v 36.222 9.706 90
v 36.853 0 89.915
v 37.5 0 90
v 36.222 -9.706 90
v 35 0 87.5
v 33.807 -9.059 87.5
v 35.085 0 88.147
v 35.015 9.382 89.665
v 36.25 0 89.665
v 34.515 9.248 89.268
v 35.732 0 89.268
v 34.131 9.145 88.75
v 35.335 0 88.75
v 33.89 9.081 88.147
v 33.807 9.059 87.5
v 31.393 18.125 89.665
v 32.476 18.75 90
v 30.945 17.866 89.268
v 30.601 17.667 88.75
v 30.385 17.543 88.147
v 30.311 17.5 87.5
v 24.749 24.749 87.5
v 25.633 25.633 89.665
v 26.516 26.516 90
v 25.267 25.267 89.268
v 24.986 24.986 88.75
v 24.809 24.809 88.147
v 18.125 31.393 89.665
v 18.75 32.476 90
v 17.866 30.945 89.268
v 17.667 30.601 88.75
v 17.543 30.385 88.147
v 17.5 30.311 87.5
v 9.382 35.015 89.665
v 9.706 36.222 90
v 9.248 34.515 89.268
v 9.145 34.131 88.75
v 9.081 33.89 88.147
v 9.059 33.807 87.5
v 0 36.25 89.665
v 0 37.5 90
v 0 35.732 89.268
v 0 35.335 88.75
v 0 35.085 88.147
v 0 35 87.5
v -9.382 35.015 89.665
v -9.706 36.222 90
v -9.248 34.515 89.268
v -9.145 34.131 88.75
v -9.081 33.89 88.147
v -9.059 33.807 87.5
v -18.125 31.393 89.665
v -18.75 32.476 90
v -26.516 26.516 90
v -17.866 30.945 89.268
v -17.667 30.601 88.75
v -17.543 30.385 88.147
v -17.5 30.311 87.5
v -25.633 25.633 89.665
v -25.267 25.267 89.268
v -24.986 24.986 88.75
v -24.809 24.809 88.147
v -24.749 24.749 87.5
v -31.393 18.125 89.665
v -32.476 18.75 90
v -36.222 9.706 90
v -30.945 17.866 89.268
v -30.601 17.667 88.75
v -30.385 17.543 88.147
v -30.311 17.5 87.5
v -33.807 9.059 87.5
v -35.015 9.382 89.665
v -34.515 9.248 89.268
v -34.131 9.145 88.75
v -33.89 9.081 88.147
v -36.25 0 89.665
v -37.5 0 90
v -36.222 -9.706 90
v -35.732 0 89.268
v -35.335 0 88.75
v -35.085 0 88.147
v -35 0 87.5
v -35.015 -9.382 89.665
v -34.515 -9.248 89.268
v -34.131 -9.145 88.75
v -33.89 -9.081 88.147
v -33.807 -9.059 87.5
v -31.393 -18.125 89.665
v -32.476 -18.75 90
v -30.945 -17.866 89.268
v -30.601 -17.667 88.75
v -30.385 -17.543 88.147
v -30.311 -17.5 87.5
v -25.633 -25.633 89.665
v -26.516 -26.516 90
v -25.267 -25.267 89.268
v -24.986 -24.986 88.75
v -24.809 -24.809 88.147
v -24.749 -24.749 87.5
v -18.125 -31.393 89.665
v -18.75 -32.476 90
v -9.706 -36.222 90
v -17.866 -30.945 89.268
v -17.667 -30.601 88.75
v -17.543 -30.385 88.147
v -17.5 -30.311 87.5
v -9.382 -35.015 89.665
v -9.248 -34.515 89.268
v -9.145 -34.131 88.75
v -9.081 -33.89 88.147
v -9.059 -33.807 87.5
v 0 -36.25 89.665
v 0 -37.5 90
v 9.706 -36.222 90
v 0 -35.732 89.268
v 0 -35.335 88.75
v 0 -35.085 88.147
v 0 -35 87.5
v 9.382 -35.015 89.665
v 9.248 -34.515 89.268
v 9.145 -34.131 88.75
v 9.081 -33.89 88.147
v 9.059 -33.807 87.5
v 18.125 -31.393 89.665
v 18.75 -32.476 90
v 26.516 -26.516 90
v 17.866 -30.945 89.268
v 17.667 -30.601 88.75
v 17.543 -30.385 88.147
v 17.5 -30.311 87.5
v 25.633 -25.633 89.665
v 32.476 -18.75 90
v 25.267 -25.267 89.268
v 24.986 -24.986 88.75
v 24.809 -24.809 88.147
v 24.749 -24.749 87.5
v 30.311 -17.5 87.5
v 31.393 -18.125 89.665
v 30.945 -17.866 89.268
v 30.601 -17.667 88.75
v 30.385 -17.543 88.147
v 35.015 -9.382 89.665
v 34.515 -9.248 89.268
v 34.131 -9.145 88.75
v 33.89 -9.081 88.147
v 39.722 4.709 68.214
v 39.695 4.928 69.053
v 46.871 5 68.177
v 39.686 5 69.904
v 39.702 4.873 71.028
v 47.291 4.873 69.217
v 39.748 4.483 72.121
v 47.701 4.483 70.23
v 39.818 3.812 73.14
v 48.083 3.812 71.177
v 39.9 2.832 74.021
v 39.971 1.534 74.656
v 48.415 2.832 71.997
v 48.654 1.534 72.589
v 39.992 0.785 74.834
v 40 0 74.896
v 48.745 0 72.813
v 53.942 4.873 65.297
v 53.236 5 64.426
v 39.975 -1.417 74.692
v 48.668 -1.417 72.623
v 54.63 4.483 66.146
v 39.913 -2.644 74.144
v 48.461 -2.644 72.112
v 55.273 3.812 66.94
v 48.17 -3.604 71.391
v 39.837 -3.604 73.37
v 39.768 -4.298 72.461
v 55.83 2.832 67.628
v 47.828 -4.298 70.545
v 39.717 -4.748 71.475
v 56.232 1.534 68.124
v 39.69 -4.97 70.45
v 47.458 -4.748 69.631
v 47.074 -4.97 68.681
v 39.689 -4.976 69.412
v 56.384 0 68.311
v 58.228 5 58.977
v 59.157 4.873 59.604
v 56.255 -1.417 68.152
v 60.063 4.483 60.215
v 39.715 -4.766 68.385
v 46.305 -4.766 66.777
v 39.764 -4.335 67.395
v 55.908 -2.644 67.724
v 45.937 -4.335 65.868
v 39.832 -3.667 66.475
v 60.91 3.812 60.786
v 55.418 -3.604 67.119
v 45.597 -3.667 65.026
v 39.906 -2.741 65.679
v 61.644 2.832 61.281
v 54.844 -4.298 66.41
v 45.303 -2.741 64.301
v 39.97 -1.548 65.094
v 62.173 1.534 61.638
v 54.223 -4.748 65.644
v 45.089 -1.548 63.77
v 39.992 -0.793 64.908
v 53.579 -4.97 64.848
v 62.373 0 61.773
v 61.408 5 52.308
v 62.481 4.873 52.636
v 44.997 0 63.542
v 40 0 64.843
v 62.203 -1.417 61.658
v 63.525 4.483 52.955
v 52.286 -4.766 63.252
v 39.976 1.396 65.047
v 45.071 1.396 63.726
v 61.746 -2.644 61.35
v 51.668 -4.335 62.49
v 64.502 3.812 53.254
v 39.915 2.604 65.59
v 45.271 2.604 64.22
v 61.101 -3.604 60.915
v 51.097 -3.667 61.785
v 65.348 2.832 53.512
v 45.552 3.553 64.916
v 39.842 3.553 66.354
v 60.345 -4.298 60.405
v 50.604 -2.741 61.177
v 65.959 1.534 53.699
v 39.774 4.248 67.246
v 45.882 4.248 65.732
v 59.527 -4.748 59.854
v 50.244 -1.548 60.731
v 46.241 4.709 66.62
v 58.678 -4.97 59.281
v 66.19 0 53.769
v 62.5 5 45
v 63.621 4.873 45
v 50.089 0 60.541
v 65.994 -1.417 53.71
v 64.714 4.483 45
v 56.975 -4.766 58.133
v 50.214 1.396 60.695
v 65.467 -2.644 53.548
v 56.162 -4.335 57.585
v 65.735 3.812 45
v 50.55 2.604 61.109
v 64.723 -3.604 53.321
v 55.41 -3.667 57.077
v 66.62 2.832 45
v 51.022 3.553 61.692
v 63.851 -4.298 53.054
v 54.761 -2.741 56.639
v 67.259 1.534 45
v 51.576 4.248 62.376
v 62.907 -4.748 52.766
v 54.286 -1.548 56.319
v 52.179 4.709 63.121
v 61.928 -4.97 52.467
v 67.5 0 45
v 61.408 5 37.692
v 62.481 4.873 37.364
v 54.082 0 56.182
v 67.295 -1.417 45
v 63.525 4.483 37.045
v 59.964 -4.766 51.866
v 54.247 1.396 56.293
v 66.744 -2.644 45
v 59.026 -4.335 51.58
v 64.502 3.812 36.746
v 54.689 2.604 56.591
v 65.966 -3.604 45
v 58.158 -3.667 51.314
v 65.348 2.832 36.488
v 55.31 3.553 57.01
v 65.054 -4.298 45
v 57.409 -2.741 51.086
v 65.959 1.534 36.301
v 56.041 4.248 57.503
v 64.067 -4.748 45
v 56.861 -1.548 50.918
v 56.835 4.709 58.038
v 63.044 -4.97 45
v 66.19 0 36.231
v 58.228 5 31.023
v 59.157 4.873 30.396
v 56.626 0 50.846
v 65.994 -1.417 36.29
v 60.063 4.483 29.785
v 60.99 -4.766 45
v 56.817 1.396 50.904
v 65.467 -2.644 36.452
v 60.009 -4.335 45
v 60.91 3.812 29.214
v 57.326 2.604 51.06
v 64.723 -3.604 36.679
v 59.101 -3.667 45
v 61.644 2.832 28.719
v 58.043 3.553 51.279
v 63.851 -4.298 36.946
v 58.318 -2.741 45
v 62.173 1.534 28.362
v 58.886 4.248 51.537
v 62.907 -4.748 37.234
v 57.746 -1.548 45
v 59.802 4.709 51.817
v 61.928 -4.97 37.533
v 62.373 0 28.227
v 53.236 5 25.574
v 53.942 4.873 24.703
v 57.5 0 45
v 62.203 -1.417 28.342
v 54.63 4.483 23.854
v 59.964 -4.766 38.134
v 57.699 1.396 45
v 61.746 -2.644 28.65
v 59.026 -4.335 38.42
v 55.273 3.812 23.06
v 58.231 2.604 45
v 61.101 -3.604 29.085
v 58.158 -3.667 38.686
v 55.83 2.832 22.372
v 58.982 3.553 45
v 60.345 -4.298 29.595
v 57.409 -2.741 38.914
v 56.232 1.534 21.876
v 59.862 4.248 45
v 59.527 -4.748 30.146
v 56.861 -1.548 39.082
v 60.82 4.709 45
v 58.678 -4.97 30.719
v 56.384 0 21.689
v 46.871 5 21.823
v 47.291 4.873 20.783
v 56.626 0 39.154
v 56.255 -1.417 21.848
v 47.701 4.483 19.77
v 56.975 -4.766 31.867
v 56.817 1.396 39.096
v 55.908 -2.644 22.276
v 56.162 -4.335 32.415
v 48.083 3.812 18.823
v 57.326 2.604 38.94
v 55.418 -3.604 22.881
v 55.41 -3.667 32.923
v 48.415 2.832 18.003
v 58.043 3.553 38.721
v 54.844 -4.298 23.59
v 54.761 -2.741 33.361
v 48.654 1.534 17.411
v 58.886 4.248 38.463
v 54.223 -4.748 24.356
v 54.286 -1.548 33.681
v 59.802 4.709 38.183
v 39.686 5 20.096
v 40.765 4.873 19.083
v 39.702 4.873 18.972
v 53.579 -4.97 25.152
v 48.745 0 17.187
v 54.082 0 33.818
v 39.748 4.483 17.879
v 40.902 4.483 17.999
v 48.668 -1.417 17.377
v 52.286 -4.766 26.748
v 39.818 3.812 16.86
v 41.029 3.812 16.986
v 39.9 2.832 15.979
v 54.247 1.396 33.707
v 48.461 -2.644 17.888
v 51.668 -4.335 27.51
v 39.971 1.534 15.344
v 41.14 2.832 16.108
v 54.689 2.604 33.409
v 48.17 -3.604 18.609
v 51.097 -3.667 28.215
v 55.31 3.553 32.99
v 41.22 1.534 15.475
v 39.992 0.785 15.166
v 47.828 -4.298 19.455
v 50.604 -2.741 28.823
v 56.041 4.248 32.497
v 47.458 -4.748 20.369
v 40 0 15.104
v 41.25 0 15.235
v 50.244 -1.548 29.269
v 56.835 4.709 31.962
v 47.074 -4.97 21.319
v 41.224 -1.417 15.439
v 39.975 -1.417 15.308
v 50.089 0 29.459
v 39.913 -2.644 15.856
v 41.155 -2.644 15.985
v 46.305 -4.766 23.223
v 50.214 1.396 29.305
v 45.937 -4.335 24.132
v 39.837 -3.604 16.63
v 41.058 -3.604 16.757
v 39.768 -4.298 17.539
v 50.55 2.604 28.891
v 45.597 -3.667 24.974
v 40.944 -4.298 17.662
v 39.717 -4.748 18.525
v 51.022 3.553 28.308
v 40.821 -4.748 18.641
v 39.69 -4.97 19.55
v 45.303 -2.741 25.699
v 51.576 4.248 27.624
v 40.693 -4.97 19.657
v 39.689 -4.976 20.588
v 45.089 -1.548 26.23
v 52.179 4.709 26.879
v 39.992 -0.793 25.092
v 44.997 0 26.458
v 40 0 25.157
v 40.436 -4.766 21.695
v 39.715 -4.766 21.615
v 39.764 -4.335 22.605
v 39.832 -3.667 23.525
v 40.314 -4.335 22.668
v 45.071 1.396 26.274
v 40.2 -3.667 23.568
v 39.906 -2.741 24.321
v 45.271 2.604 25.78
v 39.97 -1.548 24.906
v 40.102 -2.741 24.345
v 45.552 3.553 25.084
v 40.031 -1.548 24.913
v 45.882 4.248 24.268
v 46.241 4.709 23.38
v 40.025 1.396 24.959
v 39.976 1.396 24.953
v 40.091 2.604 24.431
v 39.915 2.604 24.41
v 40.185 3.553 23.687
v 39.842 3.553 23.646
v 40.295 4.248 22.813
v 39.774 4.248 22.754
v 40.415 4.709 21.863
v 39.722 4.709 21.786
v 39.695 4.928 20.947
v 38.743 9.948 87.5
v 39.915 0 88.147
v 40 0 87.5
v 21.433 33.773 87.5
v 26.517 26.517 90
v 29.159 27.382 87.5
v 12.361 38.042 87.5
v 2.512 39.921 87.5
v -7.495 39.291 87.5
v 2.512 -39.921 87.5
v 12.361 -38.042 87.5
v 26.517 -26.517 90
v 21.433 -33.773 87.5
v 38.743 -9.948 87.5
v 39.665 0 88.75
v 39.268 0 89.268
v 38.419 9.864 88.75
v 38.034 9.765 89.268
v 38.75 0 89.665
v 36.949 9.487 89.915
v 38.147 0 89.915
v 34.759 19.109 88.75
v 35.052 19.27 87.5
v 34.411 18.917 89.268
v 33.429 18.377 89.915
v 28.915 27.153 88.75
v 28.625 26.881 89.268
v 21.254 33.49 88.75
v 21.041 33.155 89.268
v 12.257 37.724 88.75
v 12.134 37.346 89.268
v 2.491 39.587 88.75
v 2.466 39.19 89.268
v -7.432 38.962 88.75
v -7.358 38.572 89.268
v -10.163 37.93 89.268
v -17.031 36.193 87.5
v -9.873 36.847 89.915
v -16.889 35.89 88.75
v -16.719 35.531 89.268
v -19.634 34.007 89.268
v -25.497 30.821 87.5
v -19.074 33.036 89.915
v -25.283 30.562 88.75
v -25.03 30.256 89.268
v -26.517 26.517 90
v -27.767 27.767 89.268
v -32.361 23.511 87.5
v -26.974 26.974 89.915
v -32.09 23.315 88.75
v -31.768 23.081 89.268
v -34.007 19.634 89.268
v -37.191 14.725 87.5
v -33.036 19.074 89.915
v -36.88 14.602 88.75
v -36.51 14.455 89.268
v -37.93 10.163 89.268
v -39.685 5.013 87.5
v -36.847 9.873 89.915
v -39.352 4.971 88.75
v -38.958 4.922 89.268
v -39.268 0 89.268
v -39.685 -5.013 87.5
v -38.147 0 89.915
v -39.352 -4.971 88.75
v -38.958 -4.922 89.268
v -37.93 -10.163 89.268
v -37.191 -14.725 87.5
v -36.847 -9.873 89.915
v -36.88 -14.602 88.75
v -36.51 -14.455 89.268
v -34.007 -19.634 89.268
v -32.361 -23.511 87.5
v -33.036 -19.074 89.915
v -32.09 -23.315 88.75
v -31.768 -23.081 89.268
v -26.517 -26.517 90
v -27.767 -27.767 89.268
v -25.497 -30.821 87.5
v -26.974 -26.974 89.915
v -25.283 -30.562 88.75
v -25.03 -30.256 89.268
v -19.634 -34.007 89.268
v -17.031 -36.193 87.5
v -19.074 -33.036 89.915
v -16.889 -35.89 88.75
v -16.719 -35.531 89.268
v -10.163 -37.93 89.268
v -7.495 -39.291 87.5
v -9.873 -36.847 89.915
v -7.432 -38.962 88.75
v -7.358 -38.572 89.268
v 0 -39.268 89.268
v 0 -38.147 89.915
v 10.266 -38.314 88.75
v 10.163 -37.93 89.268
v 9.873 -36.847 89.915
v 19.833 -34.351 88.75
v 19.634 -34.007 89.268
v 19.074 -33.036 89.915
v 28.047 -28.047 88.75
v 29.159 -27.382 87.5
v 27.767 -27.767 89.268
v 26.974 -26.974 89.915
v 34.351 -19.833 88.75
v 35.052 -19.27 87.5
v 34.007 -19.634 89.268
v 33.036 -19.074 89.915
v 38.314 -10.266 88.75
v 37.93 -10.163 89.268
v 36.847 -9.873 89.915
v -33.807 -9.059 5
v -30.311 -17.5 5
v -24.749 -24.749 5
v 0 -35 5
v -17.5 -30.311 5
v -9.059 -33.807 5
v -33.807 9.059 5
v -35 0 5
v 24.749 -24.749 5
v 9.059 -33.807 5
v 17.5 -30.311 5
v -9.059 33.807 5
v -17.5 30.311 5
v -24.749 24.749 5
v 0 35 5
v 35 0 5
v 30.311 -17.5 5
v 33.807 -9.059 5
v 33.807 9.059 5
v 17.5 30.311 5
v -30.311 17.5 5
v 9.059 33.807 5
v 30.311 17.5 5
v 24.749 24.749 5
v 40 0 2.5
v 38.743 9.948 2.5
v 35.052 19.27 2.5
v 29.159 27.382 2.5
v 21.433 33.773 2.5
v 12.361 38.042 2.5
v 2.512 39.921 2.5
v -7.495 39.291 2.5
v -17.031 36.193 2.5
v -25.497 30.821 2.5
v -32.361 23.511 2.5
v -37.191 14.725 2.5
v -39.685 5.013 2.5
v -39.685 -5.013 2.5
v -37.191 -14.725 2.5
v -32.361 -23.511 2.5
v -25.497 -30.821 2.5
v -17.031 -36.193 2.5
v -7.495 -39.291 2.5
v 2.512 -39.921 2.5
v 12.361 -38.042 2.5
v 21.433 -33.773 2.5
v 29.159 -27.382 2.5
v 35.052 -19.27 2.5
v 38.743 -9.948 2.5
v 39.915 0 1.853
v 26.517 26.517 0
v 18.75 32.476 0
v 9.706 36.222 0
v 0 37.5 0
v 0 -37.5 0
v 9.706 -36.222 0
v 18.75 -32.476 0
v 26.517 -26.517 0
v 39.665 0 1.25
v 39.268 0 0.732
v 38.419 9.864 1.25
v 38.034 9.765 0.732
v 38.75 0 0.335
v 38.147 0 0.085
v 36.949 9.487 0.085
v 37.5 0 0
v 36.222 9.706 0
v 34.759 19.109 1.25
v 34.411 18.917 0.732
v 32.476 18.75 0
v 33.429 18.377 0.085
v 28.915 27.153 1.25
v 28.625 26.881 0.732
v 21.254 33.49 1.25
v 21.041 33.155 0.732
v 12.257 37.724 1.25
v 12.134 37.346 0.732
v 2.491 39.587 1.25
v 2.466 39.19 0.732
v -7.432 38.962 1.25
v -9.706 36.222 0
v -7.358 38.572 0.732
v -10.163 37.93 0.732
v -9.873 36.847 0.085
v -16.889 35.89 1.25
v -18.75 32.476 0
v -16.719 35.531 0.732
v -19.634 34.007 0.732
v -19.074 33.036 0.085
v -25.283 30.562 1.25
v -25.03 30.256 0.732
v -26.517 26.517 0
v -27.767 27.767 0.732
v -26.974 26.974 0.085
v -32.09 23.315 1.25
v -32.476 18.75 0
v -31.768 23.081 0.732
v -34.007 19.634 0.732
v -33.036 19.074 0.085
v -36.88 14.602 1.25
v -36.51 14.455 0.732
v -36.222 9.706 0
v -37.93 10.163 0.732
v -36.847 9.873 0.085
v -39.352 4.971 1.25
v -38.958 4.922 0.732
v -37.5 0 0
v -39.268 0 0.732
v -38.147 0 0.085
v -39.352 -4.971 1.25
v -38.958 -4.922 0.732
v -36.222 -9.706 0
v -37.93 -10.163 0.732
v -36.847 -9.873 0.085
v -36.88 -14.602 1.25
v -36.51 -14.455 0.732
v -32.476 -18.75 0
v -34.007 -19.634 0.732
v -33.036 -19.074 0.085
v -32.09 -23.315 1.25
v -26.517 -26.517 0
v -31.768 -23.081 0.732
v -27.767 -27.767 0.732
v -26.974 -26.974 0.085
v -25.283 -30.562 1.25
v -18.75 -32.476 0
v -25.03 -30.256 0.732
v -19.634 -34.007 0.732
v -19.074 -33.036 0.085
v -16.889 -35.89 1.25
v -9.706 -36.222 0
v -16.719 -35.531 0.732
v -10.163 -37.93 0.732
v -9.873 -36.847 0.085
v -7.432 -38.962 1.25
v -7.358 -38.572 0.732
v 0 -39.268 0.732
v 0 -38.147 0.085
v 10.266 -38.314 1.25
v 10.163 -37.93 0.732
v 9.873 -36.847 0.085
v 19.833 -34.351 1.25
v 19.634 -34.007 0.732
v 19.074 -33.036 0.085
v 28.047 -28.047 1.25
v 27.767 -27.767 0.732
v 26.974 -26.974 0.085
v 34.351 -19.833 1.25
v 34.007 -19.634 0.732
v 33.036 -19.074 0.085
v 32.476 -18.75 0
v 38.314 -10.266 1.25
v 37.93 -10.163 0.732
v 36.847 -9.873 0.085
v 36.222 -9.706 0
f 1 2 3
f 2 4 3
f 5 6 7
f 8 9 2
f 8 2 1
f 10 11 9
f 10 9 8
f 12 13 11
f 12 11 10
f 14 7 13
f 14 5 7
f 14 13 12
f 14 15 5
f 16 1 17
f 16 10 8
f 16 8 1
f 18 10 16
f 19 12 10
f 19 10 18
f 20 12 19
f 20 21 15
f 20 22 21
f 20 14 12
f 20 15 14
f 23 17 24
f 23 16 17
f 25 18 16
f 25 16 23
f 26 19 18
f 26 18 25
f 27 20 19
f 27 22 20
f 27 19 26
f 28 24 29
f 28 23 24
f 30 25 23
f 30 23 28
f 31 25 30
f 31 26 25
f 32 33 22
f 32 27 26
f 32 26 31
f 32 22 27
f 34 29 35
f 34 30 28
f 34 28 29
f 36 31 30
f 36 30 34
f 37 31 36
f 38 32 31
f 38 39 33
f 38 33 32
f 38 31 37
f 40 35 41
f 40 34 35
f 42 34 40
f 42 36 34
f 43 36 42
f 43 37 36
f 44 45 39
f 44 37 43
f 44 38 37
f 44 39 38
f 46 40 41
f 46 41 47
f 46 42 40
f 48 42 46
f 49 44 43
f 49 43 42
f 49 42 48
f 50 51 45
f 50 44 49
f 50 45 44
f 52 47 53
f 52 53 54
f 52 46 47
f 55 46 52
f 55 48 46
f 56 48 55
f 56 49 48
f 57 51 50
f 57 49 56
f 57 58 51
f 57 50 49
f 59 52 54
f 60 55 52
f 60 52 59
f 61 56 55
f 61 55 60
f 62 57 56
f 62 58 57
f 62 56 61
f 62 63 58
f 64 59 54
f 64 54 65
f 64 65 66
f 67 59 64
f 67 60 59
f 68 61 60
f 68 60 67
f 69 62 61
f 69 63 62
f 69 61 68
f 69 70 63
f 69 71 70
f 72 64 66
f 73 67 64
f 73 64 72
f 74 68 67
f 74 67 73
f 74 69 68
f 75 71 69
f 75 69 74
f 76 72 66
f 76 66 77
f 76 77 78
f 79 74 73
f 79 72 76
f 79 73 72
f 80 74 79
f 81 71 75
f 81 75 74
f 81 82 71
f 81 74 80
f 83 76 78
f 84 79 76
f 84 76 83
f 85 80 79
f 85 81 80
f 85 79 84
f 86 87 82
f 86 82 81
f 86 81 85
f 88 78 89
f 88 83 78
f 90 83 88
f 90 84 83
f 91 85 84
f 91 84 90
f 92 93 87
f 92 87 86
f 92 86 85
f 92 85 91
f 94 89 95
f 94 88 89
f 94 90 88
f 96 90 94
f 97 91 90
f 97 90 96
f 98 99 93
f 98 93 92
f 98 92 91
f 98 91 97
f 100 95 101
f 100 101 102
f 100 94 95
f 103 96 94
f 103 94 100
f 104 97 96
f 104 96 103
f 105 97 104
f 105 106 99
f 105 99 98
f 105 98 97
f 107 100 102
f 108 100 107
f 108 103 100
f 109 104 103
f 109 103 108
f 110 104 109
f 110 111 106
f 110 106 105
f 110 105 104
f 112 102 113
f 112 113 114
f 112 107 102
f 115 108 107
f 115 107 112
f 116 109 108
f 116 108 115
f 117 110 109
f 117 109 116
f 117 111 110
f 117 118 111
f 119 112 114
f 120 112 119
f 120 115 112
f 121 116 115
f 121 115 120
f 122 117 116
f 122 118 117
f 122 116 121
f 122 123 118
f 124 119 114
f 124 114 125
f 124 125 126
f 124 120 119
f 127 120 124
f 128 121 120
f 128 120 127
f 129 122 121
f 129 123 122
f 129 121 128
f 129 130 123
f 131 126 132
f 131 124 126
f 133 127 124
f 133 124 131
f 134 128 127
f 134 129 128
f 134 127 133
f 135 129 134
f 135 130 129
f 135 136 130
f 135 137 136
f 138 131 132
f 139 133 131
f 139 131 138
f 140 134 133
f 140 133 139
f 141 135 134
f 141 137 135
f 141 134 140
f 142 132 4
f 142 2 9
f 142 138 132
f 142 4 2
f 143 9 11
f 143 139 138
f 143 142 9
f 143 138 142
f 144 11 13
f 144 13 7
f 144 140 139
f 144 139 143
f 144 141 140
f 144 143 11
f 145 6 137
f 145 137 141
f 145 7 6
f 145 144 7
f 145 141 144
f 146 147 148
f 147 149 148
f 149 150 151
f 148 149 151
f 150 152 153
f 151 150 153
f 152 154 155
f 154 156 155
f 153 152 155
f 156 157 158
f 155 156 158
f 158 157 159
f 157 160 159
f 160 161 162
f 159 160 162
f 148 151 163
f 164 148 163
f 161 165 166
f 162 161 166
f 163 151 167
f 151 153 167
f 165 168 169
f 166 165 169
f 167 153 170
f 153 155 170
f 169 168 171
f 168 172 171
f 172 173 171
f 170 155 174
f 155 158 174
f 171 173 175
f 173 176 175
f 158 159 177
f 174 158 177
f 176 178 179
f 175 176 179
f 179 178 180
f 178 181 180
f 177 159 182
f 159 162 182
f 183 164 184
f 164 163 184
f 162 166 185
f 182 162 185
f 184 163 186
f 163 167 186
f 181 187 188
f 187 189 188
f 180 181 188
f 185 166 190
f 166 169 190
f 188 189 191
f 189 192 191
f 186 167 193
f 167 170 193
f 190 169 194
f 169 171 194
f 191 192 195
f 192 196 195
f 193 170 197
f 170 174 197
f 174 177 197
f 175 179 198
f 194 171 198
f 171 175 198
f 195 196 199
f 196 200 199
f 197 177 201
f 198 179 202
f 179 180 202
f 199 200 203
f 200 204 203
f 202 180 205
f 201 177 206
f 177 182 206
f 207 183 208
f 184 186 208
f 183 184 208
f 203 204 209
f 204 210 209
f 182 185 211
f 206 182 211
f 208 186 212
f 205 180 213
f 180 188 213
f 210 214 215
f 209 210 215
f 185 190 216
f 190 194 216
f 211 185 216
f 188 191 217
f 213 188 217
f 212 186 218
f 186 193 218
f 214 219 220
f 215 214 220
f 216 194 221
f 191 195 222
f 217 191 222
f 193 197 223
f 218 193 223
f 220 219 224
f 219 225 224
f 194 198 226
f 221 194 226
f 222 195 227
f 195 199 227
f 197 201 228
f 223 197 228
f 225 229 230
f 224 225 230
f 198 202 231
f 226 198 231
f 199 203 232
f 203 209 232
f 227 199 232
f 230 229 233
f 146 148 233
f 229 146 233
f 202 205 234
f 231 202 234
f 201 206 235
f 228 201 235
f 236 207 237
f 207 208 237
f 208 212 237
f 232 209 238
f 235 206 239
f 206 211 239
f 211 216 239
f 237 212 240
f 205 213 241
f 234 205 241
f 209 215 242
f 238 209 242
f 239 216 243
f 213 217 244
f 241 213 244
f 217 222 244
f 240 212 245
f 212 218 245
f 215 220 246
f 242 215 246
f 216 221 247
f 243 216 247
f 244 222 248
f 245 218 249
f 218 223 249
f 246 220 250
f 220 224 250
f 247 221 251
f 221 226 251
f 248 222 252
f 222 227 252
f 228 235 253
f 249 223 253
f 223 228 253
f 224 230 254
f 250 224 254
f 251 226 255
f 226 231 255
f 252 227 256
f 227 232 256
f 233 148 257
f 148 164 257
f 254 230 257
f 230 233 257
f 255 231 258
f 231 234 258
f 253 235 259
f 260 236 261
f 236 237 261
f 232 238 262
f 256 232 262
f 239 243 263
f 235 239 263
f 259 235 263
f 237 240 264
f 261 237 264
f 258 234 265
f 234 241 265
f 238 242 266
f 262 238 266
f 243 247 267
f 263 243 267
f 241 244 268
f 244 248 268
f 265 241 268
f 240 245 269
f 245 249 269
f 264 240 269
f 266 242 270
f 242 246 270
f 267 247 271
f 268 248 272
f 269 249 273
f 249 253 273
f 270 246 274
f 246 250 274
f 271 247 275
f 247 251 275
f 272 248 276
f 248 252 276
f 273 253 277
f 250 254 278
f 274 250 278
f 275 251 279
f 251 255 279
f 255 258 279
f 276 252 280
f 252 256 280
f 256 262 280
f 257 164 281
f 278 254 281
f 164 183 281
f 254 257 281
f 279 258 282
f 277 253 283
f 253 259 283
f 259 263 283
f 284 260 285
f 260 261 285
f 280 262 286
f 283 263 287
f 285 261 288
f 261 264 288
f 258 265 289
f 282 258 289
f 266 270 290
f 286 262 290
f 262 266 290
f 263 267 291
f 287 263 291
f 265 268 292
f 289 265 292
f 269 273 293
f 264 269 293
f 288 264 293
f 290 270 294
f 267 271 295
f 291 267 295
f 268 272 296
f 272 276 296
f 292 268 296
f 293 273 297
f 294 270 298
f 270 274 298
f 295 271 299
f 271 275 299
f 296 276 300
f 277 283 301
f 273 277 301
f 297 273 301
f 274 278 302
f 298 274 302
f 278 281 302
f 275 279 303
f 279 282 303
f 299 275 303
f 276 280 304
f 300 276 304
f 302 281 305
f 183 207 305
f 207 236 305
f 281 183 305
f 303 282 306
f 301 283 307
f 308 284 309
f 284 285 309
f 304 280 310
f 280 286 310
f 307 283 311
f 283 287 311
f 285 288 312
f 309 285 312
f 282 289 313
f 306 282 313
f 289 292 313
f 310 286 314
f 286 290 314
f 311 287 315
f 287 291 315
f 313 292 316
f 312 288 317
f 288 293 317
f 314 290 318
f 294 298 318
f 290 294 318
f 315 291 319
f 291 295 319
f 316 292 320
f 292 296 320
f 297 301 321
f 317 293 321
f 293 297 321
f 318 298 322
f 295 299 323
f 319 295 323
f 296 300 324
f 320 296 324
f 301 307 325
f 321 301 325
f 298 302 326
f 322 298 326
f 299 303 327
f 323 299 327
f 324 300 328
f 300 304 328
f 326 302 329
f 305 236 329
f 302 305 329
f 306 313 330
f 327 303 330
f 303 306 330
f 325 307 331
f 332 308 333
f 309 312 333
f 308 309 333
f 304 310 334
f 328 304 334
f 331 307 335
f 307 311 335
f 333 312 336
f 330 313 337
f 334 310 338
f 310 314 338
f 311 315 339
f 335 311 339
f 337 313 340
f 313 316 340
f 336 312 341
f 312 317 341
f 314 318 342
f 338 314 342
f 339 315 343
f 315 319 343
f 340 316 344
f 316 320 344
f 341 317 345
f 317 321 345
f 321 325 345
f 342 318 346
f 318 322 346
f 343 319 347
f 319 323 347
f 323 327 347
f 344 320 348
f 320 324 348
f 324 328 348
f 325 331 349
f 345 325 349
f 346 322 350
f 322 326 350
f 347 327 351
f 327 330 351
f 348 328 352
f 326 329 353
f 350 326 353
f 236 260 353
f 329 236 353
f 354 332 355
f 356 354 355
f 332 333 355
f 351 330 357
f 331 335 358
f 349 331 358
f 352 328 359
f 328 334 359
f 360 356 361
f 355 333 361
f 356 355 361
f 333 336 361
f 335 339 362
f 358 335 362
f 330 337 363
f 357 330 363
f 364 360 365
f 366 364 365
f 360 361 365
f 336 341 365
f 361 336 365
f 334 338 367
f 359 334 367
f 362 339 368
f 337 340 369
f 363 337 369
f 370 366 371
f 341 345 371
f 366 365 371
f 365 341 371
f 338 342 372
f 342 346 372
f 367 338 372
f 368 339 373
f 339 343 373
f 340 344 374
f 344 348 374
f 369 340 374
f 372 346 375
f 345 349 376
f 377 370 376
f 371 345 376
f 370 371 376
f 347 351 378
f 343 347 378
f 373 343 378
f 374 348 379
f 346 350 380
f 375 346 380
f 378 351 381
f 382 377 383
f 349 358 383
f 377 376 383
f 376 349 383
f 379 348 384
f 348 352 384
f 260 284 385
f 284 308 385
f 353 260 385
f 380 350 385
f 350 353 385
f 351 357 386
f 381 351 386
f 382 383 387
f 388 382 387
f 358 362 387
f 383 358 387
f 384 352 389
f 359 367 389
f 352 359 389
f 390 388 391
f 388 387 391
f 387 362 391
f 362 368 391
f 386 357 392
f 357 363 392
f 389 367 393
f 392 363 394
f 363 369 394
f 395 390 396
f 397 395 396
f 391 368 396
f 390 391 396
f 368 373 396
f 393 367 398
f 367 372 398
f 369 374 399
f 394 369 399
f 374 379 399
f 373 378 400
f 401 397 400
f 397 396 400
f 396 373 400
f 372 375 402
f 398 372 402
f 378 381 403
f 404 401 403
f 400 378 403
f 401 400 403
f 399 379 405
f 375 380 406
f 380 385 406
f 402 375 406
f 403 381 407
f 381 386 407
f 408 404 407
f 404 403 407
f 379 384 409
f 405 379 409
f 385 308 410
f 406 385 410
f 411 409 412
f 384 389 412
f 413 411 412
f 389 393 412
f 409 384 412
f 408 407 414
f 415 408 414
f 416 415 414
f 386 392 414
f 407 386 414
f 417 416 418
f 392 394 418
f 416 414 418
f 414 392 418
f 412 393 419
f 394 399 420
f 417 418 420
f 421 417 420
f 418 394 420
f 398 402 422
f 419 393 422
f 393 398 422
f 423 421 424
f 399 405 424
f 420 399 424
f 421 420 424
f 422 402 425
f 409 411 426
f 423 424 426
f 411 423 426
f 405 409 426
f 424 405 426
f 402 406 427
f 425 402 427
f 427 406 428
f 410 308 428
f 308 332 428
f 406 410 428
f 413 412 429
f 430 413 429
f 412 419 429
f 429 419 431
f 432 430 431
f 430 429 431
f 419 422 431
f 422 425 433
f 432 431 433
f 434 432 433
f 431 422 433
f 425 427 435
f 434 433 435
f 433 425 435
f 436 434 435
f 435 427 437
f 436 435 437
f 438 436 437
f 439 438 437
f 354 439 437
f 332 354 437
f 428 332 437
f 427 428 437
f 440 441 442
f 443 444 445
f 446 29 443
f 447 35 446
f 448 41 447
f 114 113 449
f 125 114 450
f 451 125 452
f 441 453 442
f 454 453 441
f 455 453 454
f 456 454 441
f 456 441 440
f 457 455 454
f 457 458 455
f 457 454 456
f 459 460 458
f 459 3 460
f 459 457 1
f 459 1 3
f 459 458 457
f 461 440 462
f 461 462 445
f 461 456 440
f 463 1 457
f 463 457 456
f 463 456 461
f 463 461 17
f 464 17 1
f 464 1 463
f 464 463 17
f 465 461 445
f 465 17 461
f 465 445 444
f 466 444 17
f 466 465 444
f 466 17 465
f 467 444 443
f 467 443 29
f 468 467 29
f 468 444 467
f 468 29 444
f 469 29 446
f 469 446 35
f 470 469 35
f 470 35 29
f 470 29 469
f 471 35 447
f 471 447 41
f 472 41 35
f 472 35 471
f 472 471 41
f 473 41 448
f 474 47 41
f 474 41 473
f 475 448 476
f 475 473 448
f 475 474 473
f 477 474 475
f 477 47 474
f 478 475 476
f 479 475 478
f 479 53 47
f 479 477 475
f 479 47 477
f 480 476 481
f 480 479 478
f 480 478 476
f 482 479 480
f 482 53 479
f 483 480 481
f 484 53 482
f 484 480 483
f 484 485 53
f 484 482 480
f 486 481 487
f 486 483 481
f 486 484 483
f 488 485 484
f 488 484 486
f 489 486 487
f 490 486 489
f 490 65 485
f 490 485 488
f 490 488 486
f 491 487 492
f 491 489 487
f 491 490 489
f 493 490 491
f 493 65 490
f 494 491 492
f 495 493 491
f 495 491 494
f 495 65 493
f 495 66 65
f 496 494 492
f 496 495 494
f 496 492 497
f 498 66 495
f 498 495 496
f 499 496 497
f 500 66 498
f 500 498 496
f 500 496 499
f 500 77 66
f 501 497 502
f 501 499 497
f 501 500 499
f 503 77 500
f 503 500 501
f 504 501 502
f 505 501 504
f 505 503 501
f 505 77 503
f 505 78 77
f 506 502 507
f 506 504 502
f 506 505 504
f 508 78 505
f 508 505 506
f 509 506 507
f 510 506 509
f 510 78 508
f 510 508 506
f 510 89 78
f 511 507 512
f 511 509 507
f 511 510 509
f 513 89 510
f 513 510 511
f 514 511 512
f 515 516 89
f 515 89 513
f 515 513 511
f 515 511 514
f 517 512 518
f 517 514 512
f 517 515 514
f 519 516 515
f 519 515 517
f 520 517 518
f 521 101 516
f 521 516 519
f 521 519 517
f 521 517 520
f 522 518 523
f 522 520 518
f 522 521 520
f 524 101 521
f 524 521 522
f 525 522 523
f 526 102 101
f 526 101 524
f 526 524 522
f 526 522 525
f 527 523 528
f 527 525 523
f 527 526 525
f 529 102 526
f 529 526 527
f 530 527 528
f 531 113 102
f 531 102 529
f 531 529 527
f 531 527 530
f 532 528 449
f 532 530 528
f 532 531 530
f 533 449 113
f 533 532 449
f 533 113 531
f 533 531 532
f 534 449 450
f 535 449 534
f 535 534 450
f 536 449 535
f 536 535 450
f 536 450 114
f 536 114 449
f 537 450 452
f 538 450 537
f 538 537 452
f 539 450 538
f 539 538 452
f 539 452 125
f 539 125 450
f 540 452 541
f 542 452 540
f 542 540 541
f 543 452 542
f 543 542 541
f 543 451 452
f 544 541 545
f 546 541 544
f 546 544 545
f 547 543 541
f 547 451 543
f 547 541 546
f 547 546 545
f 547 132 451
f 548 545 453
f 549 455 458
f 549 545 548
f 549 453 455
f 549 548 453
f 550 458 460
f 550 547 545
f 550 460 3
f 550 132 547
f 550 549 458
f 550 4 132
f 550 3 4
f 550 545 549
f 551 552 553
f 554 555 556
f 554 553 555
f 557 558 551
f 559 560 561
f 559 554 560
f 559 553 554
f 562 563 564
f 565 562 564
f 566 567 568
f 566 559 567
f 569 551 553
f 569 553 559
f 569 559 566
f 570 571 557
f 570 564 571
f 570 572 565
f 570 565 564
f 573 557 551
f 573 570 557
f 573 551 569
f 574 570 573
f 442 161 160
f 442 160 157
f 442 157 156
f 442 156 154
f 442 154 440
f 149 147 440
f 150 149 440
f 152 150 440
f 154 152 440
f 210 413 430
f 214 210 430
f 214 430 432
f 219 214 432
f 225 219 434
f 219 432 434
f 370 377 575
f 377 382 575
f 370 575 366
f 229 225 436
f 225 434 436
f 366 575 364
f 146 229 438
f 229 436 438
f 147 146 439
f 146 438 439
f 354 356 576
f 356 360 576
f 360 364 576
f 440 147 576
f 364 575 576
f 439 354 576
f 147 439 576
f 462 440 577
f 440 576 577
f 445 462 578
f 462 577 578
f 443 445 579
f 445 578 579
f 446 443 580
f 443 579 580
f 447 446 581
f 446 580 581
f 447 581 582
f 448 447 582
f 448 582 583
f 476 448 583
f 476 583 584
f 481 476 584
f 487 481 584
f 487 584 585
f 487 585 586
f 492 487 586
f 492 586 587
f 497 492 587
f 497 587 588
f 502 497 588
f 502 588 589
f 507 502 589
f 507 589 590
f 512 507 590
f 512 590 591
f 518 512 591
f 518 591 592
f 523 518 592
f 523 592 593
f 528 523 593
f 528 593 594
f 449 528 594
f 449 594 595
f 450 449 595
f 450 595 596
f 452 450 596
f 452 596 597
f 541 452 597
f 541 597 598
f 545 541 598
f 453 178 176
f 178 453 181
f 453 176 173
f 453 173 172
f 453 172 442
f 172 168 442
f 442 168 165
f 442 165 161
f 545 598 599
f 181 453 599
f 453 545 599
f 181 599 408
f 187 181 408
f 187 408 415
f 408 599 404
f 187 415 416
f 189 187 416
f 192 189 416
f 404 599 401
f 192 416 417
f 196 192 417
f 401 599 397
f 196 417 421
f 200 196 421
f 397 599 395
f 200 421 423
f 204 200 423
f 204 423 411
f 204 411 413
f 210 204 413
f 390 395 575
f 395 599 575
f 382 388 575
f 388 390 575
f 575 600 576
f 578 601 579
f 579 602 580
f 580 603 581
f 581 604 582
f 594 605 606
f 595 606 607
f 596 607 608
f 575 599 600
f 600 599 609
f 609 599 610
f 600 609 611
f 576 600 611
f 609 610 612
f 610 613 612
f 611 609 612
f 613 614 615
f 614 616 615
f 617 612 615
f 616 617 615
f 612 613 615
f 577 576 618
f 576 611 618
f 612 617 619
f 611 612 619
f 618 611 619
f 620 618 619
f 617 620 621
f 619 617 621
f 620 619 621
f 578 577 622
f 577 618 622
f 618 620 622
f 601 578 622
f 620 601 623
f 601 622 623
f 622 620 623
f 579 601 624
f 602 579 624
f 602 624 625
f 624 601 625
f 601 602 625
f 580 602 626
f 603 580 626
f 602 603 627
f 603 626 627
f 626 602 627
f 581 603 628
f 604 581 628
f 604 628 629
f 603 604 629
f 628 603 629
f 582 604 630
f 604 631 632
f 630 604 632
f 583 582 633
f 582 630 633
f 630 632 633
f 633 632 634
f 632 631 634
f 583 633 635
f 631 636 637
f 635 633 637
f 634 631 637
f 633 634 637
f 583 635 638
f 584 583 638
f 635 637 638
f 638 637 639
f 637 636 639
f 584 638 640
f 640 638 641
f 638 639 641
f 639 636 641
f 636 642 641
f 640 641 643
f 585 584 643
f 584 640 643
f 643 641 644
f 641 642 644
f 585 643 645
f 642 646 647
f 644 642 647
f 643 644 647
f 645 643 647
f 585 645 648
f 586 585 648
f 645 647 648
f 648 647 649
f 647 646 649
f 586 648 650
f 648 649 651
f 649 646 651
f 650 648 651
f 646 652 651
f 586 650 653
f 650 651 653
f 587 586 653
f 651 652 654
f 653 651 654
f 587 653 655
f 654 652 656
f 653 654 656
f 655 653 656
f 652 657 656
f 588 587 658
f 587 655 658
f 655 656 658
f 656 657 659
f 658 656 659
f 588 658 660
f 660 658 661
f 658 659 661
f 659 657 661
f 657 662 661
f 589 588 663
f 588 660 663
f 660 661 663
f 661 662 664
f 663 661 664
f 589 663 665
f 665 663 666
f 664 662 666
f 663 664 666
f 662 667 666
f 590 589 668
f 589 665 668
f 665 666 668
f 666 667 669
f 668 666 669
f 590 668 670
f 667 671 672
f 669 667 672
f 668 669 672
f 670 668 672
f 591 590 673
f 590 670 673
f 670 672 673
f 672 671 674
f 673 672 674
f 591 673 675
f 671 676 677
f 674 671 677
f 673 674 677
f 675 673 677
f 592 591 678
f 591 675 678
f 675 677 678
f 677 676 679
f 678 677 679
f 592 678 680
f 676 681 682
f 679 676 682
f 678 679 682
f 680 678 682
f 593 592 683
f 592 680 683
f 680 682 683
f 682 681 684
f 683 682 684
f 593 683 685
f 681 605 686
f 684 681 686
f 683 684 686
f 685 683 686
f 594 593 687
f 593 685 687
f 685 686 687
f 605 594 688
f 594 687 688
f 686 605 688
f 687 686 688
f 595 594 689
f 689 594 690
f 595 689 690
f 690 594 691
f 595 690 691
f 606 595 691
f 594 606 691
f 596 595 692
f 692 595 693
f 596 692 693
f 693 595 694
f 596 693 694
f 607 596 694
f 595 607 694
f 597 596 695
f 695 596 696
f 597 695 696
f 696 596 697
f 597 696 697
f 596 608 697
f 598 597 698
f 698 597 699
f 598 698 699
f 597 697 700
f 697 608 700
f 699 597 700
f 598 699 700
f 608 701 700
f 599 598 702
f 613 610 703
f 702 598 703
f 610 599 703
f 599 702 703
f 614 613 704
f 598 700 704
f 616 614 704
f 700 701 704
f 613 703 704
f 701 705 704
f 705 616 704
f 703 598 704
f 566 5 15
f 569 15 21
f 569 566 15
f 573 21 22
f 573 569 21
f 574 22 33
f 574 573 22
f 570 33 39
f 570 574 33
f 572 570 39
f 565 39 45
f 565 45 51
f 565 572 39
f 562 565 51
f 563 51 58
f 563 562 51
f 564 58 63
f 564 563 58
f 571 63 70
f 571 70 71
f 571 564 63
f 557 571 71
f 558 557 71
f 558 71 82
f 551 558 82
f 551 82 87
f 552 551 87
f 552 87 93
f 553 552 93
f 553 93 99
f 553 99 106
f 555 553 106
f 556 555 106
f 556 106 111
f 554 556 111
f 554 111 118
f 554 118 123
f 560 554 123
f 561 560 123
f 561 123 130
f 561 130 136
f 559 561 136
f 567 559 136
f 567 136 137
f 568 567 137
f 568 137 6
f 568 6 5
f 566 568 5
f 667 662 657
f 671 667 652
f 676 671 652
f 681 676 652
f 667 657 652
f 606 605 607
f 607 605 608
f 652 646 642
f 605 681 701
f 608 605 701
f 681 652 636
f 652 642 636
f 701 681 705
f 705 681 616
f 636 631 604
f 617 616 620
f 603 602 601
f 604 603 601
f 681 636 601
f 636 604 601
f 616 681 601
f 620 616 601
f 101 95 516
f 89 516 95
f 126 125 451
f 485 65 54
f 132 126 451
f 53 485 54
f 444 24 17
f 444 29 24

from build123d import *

# Parameters (mm, degrees)
F0_R     = 40
F1_DEPTH = 90
F2_T     = -5
F4_R     = 5
F5_ANGLE = 180
F6_R     = 2.49999
F7_R     = 2.5


# Not quite as in the source:
# - a fillet or chamfer is up to 0.001 mm smaller than in the source, because OpenCascade refuses the exact size


with BuildPart() as f1:
    # F0 (on Top) → F1 (new body)
    with BuildSketch(Plane.XY):
        Circle(F0_R)
    extrude(amount=F1_DEPTH)

    # F2
    f2_openings = [f1.faces().sort_by_distance(p)[0] for p in [
        (0, 0, 90),
    ]]
    offset(amount=F2_T, openings=f2_openings)

    # F4 (on offset) → F5 (revolve)
    with BuildSketch(Plane.YZ.offset(37.5)):
        with Locations((0, 70)):
            Circle(F4_R)
    revolve(axis=Axis((37.5, 33.2942344248, 45), (0, 1, 0)), revolution_arc=F5_ANGLE)

    # F6 (radius 2.5 in the source; OpenCascade refuses exactly that, so slightly less here)
    f6_edges = [f1.edges().sort_by_distance(p)[0] for p in [
        (-40, 0, 90),
        (-35, 0, 90),
    ]]
    fillet(f6_edges, radius=F6_R)

    # F7
    f7_edges = [f1.edges().sort_by_distance(p)[0] for p in [
        (-40, 0, 0),
    ]]
    fillet(f7_edges, radius=F7_R)


solid = f1.part
